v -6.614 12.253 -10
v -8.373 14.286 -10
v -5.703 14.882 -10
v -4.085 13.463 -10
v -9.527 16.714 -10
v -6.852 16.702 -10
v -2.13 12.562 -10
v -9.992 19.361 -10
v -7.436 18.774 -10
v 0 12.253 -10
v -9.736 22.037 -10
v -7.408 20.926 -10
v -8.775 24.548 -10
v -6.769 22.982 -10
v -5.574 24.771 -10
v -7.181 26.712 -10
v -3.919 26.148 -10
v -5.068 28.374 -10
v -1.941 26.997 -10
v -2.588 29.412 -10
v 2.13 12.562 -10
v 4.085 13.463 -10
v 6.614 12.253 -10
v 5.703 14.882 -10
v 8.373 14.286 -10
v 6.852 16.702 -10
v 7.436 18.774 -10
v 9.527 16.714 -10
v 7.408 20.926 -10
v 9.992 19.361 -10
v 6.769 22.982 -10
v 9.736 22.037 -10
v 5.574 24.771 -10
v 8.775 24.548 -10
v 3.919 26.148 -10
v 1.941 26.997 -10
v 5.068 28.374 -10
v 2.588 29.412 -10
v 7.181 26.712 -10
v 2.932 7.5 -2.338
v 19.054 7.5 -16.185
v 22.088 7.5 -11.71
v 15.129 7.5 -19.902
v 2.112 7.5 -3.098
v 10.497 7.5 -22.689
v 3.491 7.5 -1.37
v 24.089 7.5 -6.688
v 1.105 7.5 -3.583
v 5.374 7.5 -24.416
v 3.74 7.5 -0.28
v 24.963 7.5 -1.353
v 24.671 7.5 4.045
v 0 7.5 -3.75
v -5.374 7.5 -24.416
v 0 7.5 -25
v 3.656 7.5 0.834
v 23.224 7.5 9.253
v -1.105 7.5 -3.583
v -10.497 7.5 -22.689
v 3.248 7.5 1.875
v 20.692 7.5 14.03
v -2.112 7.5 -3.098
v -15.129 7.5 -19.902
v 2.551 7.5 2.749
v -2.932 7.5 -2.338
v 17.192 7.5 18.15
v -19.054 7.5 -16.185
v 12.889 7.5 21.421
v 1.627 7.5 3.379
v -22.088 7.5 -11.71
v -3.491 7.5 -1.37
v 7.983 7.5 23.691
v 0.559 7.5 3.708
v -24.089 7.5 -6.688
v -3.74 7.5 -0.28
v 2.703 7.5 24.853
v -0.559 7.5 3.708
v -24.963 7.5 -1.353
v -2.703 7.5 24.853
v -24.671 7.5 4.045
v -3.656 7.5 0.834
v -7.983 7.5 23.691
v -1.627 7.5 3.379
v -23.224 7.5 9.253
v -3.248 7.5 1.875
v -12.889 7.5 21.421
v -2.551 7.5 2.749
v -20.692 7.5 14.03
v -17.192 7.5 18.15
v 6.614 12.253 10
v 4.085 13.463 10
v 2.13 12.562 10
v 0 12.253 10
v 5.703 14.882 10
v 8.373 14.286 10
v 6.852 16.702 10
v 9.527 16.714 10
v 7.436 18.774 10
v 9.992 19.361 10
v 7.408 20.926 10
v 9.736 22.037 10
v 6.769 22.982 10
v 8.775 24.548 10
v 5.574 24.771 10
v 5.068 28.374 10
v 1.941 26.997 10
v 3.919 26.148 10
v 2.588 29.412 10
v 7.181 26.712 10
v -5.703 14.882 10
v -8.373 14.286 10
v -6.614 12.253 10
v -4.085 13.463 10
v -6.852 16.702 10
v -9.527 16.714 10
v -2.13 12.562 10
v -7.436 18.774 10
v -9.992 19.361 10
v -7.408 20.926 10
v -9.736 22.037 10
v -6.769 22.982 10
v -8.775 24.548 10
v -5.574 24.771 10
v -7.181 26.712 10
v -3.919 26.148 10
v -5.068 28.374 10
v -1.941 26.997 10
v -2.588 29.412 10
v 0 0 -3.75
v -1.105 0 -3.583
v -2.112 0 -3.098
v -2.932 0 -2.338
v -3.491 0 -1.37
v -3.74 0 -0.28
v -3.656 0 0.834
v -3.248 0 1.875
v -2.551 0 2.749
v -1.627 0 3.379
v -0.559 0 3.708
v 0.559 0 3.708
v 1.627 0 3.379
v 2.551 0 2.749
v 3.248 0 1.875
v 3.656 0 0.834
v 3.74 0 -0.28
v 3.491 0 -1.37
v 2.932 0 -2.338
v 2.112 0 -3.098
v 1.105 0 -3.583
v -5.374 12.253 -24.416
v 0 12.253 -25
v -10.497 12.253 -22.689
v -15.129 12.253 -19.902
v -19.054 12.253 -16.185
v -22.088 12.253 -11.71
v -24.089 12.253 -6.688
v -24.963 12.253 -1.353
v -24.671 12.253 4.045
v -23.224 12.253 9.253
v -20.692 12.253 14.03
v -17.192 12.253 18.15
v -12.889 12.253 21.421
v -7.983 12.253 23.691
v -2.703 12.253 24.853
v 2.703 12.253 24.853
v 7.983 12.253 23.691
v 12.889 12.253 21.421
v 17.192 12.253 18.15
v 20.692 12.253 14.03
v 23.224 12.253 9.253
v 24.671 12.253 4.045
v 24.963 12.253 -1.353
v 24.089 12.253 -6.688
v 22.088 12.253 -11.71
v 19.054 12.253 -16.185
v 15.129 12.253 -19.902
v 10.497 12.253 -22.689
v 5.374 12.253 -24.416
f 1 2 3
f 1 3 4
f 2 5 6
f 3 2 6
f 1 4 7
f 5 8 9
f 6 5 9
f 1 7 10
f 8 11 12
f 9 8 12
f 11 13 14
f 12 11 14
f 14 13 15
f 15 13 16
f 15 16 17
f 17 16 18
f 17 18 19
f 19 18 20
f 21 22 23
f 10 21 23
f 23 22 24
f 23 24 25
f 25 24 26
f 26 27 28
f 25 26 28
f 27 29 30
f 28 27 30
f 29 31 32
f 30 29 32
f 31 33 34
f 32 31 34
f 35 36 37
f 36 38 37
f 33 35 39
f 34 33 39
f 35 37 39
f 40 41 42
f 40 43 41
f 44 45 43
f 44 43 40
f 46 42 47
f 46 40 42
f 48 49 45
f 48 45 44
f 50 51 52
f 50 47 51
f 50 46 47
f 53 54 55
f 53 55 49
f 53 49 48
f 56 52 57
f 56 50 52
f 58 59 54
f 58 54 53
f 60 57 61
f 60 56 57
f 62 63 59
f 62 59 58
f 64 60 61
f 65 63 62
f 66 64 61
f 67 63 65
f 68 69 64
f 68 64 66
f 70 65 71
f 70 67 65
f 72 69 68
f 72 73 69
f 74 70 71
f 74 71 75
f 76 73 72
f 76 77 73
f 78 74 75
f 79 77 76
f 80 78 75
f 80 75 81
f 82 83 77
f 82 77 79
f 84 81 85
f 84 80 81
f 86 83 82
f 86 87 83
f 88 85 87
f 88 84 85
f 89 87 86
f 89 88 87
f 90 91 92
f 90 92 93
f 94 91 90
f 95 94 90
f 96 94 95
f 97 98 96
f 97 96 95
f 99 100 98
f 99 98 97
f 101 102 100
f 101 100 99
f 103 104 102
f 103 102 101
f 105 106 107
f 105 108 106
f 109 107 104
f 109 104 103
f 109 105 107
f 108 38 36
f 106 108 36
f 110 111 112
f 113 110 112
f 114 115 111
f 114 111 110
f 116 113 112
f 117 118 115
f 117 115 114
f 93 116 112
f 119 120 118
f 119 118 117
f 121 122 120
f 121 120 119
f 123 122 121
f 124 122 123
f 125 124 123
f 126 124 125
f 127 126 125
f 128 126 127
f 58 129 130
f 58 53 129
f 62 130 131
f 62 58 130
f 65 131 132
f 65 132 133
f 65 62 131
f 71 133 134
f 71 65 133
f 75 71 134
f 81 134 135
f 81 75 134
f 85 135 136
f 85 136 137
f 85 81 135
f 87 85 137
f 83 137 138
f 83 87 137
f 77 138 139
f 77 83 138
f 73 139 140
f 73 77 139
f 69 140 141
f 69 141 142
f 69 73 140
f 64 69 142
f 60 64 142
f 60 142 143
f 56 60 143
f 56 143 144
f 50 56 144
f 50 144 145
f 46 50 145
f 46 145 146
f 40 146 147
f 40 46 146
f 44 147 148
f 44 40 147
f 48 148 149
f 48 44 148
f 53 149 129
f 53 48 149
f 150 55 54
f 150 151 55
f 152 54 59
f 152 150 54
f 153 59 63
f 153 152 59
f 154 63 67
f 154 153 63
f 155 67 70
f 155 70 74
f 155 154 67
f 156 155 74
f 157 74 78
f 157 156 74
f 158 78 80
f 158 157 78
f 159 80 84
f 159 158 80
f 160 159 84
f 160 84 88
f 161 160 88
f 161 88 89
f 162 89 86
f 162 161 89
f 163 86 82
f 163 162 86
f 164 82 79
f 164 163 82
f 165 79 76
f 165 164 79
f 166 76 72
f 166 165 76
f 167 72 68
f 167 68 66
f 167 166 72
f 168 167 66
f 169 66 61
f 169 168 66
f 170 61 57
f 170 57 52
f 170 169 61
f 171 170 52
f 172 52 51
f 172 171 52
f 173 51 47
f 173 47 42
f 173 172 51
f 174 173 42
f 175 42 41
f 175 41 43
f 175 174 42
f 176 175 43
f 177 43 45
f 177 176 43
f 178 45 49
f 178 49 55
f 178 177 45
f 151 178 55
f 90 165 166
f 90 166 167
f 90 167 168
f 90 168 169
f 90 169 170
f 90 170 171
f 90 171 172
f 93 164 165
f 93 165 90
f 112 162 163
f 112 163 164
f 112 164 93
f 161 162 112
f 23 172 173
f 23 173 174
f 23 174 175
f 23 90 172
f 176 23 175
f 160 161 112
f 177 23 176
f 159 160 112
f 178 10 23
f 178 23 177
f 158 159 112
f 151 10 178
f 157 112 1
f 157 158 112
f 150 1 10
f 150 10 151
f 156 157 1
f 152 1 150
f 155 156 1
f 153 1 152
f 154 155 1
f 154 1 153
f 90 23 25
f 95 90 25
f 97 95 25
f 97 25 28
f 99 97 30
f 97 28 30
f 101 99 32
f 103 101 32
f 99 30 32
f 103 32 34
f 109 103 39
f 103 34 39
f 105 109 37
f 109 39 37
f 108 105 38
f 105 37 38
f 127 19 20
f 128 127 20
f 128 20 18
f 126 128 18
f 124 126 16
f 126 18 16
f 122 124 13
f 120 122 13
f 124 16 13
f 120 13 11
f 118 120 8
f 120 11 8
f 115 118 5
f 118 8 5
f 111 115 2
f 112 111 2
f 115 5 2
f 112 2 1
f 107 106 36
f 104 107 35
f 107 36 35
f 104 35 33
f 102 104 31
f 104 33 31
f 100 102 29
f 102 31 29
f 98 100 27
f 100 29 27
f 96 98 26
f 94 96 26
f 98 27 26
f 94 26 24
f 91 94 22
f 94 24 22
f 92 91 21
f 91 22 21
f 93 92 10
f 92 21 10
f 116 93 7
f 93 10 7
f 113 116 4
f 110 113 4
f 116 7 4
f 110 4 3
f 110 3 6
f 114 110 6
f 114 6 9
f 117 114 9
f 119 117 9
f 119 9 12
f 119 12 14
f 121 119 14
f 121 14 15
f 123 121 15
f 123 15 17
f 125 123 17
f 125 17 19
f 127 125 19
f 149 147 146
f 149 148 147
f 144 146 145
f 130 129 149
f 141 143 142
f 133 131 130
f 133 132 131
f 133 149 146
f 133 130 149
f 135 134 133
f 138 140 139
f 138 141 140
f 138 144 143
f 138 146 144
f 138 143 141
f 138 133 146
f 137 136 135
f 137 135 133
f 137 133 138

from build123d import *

# Parameters (mm, degrees)
SALIENTE_EXTRUIR1_DEPTH      = 10
SALIENTE_EXTRUIR1_DEPTH_BACK = 10


with BuildPart() as part:
    # Croquis1 → Revolución1 (revolve)
    with BuildSketch(Plane.XY):
        Polygon((0, 0), (3.75, 0), (3.75, 7.5), (25, 7.5), (25, 12.252764843), (0, 12.252764843), align=None)
    revolve(axis=Axis((0, 0, 0), (0, 1, 0)))

    # Croquis2 → Saliente-Extruir1 (add, two sides: drawn at the far end of the back side and taken through both)
    with BuildSketch(Plane.XY.offset(-SALIENTE_EXTRUIR1_DEPTH_BACK)):
        with BuildLine():
            Line((-1.941142838, 26.99720854), (-2.588190451, 29.412023106))
            ThreePointArc((-2.588190451, 29.412023106), (0, 9.752764843), (2.588190451, 29.412023106))
            Line((2.588190451, 29.412023106), (1.941142838, 26.99720854))
            ThreePointArc((1.941142838, 26.99720854), (0, 12.252764843), (-1.941142838, 26.99720854))
        make_face()
    extrude(amount=SALIENTE_EXTRUIR1_DEPTH + SALIENTE_EXTRUIR1_DEPTH_BACK)


solid = part.part
